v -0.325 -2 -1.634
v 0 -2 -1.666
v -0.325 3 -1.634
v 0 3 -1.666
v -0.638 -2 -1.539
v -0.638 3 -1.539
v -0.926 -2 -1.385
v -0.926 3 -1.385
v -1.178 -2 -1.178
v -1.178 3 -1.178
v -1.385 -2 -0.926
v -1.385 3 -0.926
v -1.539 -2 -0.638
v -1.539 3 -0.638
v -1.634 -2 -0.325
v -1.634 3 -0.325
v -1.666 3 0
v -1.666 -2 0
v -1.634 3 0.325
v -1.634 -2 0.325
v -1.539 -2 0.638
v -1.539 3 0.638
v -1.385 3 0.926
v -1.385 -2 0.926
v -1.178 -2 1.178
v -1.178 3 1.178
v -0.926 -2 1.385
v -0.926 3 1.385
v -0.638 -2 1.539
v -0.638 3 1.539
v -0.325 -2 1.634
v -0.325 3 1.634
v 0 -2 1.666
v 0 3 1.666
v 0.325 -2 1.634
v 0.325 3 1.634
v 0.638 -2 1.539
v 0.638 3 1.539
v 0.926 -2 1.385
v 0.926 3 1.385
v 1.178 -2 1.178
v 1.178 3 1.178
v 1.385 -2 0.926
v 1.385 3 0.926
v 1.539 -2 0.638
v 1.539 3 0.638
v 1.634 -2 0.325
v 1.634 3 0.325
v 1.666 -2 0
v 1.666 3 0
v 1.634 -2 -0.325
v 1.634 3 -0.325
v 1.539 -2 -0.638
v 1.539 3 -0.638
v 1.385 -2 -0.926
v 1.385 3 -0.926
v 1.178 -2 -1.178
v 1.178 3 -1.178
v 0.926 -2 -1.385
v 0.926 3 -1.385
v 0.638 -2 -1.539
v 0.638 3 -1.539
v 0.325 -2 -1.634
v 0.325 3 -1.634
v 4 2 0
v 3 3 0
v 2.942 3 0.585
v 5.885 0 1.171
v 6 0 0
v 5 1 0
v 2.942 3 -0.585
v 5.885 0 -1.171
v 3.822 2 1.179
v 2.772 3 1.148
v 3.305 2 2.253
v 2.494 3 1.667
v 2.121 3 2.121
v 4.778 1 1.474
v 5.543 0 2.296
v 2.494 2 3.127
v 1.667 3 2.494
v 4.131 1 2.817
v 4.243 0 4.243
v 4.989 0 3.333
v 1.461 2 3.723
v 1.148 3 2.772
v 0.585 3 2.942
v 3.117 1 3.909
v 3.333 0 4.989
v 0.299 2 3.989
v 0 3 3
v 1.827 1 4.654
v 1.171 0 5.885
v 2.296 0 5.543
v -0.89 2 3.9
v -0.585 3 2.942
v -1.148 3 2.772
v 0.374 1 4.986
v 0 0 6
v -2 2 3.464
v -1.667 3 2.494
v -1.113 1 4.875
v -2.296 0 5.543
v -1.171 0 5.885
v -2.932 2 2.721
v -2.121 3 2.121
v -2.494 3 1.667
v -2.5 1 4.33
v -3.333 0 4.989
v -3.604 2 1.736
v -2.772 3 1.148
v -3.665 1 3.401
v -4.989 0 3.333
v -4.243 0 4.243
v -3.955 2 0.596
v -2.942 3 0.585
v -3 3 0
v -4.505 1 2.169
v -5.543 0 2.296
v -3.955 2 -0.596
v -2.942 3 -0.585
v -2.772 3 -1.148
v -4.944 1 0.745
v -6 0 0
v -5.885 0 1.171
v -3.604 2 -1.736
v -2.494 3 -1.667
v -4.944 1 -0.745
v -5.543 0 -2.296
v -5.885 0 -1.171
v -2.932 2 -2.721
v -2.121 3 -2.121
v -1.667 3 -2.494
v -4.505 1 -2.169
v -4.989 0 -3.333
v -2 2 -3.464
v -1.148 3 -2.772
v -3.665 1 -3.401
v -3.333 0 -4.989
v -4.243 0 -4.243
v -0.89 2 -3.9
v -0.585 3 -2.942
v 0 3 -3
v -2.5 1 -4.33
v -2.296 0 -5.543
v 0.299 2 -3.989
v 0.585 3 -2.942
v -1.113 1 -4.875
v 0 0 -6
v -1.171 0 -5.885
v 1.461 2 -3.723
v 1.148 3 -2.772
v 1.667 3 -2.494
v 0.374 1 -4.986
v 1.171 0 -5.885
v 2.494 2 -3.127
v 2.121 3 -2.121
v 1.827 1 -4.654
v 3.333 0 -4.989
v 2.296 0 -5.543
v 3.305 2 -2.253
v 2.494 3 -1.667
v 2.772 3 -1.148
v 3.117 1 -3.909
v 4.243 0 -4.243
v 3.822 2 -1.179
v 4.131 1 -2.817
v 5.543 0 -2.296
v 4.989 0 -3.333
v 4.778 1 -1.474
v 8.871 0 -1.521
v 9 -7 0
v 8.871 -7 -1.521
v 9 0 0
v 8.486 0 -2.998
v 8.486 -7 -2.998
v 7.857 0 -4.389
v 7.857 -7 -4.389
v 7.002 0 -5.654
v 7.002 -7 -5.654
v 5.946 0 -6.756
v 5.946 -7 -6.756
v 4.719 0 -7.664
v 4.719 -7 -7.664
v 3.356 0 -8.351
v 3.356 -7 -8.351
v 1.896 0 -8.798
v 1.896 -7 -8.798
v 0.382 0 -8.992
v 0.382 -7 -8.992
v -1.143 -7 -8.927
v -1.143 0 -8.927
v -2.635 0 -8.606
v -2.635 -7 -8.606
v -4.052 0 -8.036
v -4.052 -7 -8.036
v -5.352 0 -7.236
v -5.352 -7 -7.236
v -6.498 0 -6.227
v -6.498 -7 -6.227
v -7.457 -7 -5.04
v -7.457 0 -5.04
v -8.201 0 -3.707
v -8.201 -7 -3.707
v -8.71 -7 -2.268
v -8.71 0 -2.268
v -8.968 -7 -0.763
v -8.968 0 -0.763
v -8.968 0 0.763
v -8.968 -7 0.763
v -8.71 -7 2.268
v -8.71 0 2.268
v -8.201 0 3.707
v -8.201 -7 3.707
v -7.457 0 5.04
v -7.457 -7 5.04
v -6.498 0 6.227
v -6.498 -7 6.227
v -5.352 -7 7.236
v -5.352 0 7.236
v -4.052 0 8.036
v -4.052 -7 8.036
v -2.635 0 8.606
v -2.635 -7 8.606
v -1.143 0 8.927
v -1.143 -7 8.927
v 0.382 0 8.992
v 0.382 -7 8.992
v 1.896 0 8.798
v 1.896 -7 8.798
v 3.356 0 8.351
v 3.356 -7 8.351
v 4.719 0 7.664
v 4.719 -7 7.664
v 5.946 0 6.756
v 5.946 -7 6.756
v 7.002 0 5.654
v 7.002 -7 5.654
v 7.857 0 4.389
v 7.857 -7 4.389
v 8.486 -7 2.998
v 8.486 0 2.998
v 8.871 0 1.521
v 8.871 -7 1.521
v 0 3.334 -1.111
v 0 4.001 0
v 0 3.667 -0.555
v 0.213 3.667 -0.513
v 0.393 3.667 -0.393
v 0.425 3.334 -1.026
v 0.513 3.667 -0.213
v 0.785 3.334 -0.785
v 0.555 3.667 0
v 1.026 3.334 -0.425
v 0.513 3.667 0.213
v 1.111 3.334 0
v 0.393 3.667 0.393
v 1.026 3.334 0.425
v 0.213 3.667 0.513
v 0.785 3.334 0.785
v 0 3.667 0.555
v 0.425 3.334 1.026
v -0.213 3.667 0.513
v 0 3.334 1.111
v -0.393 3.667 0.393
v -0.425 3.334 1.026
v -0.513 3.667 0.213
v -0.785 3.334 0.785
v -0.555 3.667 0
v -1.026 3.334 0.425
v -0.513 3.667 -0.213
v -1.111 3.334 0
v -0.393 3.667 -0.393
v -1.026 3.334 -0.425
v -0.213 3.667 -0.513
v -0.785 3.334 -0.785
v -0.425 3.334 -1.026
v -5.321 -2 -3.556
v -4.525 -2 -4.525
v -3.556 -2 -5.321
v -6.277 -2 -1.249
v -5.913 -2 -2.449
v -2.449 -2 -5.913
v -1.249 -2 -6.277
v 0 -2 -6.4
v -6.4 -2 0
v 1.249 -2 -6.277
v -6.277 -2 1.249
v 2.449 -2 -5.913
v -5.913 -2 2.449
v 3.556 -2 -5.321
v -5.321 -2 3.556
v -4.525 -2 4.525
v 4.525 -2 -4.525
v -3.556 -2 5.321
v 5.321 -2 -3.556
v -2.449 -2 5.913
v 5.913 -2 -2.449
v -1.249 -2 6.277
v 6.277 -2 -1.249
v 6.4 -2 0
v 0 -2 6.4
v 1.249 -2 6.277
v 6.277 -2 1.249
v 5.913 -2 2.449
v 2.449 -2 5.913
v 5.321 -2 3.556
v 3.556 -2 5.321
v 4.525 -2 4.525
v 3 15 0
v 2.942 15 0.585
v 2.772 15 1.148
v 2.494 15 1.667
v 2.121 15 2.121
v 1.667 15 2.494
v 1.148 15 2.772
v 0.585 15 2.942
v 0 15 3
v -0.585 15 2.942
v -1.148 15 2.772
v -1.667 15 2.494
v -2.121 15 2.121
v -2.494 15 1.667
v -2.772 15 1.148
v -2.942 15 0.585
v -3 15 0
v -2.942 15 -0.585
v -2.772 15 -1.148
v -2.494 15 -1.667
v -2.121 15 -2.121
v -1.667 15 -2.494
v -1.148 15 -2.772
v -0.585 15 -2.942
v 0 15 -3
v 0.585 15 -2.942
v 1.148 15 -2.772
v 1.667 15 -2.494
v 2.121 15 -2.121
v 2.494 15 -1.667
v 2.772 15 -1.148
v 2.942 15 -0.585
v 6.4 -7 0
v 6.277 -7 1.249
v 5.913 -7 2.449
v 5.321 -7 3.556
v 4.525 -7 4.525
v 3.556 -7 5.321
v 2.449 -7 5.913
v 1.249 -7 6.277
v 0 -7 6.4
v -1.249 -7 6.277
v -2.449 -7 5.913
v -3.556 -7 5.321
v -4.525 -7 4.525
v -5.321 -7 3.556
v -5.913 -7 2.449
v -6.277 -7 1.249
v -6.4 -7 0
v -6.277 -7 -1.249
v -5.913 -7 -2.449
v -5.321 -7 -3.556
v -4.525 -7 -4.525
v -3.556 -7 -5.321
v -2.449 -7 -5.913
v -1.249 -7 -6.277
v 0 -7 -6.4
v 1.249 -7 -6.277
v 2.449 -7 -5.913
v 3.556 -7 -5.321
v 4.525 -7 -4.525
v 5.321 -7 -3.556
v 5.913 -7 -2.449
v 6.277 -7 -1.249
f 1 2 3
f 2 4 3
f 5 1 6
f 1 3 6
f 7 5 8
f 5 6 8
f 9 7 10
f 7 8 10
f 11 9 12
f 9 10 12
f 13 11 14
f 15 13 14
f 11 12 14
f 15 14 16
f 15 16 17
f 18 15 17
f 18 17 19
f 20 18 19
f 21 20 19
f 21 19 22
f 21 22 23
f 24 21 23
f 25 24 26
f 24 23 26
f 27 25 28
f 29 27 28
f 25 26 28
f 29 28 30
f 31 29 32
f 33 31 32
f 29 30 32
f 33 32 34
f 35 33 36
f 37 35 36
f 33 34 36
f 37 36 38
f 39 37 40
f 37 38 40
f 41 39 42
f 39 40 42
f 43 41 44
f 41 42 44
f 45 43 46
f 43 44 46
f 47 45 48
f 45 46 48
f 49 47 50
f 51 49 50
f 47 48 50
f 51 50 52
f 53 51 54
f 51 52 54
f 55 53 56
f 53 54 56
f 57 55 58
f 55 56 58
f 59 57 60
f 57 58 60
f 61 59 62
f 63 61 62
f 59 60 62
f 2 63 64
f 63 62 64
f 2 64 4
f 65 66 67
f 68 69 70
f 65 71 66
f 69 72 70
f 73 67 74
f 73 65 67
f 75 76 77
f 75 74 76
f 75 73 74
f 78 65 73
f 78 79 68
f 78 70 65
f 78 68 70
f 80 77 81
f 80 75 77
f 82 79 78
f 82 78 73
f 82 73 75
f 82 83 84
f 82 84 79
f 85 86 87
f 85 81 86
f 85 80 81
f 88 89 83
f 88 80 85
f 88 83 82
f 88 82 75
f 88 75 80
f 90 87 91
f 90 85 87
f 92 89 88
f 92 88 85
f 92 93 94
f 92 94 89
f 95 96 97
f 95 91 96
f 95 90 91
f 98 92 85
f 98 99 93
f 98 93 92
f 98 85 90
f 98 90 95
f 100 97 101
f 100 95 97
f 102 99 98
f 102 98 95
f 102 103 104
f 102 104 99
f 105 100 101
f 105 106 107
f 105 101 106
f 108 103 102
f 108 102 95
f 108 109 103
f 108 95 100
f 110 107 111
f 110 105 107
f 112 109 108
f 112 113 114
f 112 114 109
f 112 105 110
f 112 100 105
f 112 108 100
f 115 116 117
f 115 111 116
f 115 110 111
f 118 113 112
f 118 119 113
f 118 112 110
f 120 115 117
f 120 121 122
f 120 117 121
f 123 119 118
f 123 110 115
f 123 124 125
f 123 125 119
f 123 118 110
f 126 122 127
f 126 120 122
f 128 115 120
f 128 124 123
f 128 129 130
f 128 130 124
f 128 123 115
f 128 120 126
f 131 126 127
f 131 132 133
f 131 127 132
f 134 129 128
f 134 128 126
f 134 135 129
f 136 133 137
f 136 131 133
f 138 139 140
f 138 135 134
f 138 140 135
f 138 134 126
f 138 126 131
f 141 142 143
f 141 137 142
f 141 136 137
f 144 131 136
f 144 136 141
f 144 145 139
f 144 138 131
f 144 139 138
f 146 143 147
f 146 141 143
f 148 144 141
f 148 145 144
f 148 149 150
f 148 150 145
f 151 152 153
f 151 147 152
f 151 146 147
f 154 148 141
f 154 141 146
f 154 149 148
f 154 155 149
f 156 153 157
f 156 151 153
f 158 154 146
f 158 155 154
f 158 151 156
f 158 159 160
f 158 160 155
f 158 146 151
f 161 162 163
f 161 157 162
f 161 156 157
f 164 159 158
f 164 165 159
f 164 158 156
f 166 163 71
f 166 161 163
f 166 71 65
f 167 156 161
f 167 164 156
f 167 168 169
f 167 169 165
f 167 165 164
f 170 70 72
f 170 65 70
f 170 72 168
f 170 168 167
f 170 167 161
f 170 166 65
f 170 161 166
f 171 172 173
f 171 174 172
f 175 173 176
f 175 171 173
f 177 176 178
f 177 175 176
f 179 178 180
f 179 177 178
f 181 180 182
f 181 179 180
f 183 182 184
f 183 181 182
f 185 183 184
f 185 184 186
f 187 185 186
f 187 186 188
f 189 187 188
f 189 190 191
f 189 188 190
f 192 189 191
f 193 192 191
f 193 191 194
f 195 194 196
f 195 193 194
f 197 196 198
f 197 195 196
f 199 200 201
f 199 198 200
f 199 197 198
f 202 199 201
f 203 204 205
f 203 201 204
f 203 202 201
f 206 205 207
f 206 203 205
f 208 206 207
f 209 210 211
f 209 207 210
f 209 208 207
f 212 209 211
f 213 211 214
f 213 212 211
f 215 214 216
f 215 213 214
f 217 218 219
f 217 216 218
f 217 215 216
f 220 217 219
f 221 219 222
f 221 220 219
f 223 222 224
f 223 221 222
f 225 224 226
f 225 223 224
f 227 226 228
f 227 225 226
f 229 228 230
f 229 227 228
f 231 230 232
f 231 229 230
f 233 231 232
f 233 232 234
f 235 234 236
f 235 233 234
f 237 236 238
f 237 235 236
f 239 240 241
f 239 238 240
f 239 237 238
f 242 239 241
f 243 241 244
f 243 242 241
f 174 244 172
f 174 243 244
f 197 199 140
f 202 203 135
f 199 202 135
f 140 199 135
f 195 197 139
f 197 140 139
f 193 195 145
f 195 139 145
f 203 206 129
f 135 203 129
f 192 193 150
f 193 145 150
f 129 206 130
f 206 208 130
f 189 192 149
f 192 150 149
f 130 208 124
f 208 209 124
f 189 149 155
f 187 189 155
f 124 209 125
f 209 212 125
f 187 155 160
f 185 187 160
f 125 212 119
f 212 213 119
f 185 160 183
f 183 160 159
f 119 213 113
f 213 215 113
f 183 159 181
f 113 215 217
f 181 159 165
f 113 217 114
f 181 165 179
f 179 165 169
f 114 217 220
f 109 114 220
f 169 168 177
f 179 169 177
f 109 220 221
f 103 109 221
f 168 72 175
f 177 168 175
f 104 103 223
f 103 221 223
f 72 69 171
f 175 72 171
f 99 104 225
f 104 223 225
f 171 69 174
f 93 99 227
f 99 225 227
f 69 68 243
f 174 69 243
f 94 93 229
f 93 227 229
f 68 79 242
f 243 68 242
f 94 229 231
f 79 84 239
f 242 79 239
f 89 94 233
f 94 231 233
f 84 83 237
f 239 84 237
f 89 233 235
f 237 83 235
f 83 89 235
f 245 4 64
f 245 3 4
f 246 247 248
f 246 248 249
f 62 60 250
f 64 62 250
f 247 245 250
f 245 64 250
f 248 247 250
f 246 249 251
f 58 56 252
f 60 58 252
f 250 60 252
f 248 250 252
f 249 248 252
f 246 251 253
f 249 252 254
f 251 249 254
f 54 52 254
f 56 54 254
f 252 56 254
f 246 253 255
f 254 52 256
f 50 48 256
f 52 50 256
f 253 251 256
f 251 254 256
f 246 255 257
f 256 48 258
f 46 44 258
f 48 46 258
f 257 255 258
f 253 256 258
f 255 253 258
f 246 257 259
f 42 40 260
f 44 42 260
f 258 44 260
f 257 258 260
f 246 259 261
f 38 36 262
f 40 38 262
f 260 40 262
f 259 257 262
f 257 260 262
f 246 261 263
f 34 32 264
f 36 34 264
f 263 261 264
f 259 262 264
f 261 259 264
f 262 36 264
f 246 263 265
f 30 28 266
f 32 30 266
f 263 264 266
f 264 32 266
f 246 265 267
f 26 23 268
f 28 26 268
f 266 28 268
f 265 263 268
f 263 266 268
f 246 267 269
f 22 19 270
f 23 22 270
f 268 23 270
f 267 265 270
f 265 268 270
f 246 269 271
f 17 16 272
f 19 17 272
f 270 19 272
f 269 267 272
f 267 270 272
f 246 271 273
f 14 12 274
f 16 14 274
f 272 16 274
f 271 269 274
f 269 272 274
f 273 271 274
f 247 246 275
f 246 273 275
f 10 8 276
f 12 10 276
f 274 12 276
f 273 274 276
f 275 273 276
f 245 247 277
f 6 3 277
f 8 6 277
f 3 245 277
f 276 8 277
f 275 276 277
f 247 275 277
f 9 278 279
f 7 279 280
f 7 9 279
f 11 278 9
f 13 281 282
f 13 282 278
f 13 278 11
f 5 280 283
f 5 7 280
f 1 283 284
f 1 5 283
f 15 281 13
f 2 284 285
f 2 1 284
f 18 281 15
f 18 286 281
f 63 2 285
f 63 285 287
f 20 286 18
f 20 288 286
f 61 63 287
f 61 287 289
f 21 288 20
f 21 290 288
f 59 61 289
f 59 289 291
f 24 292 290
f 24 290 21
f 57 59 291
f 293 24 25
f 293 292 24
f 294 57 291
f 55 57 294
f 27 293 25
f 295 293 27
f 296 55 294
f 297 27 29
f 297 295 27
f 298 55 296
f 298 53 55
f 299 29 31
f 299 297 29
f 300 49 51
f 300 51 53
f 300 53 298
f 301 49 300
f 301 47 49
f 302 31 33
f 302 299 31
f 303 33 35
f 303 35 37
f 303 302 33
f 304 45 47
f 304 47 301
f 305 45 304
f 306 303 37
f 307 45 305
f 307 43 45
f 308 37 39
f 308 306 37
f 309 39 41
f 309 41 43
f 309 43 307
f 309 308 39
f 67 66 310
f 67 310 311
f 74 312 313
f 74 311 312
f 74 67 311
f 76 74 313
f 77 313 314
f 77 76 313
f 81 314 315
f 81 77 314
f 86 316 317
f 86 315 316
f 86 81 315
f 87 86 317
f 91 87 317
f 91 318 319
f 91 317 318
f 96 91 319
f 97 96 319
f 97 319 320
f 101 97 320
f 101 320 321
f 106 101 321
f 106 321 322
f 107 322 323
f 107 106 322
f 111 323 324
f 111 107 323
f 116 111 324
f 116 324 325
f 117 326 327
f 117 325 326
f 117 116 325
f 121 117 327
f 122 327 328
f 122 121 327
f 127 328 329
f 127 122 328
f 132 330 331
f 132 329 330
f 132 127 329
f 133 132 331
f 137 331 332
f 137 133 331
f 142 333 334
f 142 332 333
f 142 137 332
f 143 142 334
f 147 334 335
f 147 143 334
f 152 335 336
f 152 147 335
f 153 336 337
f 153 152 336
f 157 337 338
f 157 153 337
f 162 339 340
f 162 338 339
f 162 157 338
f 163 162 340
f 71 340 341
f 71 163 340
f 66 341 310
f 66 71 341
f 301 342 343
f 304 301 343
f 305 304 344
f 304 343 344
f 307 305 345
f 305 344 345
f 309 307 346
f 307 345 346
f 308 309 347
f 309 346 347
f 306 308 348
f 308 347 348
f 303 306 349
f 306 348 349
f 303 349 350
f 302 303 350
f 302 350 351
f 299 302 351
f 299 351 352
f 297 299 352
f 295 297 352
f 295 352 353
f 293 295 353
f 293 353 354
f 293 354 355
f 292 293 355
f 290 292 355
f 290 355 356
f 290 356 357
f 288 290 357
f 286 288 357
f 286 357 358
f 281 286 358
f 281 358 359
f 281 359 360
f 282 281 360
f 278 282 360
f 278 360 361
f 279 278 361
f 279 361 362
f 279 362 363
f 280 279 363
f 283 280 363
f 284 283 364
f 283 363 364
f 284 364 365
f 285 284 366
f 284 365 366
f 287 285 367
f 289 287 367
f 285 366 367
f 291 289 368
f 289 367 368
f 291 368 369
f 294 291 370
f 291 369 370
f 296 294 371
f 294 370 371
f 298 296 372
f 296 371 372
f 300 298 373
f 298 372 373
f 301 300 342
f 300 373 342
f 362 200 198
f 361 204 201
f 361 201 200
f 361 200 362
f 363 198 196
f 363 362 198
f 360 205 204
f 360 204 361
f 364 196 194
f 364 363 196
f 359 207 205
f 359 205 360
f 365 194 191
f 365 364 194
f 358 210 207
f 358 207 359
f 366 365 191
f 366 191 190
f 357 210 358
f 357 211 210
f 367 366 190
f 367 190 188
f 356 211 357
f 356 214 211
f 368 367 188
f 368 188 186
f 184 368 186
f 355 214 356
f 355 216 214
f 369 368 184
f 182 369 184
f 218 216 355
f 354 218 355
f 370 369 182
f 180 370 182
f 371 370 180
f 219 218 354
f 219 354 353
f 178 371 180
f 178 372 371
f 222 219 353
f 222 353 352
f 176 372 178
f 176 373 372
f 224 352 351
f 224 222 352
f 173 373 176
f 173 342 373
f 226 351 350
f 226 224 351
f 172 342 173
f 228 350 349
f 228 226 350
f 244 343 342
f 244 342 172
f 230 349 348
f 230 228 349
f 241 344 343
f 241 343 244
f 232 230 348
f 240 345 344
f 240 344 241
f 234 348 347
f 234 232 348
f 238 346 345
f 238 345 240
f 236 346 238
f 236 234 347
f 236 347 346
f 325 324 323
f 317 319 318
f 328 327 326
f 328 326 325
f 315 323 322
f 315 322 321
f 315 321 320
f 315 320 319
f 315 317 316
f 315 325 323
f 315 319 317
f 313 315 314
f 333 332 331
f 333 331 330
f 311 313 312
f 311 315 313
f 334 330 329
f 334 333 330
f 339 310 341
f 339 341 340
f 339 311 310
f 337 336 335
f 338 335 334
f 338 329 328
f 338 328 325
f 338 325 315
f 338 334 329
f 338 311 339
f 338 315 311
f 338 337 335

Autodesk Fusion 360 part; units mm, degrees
sketch "Sketch1" plane through (0, 0, 0) normal (0, 1, 0) x (1, 0, 0)
  circle A0 centre (0, 0) radius 3
  dimension "d1" = 6
extrude "Extrude1" add sketch "Sketch1" along normal blind 13
sketch "Sketch2" plane through (0, 0, 0) normal (0, -1, 0) x (1, 0, 0)
  circle A0 centre (0, 0) radius 3
  circle A1 centre (0, 0) radius 9
  dimension "d4" = 18
extrude "Extrude2" add sketch "Sketch2" along normal blind 7 contours A0 | A1
sketch "Sketch3" plane through (0, -7, 0) normal (0, -1, 0) x (1, 0, 0)
  circle A0 centre (0, 0) radius 9
  circle A1 centre (0, 0) radius 6.4
  dimension "d7" = 12.8
extrude "Extrude3" cut sketch "Sketch3" against normal blind 5 contours A1
sketch "Sketch4" plane through (0, -2, 0) normal (0, -1, 0) x (1, 0, 0)
  circle A0 centre (0, 0) radius 6.4
  circle A1 centre (0, 0) radius 2
  dimension "d10" = 4
hole "Hole1" at (0, -2, 0) direction (0, 1, 0) diameter 3.332 depth 5 tip angle 118
chamfer "Chamfer1" distance 3 angle 45 1 edges at (-2.797, 0, 1.0848)
extrude "Extrude4" add 1 faces at (0.3505, 13, 0.866) along direction (0, 1, 0) blind 2
